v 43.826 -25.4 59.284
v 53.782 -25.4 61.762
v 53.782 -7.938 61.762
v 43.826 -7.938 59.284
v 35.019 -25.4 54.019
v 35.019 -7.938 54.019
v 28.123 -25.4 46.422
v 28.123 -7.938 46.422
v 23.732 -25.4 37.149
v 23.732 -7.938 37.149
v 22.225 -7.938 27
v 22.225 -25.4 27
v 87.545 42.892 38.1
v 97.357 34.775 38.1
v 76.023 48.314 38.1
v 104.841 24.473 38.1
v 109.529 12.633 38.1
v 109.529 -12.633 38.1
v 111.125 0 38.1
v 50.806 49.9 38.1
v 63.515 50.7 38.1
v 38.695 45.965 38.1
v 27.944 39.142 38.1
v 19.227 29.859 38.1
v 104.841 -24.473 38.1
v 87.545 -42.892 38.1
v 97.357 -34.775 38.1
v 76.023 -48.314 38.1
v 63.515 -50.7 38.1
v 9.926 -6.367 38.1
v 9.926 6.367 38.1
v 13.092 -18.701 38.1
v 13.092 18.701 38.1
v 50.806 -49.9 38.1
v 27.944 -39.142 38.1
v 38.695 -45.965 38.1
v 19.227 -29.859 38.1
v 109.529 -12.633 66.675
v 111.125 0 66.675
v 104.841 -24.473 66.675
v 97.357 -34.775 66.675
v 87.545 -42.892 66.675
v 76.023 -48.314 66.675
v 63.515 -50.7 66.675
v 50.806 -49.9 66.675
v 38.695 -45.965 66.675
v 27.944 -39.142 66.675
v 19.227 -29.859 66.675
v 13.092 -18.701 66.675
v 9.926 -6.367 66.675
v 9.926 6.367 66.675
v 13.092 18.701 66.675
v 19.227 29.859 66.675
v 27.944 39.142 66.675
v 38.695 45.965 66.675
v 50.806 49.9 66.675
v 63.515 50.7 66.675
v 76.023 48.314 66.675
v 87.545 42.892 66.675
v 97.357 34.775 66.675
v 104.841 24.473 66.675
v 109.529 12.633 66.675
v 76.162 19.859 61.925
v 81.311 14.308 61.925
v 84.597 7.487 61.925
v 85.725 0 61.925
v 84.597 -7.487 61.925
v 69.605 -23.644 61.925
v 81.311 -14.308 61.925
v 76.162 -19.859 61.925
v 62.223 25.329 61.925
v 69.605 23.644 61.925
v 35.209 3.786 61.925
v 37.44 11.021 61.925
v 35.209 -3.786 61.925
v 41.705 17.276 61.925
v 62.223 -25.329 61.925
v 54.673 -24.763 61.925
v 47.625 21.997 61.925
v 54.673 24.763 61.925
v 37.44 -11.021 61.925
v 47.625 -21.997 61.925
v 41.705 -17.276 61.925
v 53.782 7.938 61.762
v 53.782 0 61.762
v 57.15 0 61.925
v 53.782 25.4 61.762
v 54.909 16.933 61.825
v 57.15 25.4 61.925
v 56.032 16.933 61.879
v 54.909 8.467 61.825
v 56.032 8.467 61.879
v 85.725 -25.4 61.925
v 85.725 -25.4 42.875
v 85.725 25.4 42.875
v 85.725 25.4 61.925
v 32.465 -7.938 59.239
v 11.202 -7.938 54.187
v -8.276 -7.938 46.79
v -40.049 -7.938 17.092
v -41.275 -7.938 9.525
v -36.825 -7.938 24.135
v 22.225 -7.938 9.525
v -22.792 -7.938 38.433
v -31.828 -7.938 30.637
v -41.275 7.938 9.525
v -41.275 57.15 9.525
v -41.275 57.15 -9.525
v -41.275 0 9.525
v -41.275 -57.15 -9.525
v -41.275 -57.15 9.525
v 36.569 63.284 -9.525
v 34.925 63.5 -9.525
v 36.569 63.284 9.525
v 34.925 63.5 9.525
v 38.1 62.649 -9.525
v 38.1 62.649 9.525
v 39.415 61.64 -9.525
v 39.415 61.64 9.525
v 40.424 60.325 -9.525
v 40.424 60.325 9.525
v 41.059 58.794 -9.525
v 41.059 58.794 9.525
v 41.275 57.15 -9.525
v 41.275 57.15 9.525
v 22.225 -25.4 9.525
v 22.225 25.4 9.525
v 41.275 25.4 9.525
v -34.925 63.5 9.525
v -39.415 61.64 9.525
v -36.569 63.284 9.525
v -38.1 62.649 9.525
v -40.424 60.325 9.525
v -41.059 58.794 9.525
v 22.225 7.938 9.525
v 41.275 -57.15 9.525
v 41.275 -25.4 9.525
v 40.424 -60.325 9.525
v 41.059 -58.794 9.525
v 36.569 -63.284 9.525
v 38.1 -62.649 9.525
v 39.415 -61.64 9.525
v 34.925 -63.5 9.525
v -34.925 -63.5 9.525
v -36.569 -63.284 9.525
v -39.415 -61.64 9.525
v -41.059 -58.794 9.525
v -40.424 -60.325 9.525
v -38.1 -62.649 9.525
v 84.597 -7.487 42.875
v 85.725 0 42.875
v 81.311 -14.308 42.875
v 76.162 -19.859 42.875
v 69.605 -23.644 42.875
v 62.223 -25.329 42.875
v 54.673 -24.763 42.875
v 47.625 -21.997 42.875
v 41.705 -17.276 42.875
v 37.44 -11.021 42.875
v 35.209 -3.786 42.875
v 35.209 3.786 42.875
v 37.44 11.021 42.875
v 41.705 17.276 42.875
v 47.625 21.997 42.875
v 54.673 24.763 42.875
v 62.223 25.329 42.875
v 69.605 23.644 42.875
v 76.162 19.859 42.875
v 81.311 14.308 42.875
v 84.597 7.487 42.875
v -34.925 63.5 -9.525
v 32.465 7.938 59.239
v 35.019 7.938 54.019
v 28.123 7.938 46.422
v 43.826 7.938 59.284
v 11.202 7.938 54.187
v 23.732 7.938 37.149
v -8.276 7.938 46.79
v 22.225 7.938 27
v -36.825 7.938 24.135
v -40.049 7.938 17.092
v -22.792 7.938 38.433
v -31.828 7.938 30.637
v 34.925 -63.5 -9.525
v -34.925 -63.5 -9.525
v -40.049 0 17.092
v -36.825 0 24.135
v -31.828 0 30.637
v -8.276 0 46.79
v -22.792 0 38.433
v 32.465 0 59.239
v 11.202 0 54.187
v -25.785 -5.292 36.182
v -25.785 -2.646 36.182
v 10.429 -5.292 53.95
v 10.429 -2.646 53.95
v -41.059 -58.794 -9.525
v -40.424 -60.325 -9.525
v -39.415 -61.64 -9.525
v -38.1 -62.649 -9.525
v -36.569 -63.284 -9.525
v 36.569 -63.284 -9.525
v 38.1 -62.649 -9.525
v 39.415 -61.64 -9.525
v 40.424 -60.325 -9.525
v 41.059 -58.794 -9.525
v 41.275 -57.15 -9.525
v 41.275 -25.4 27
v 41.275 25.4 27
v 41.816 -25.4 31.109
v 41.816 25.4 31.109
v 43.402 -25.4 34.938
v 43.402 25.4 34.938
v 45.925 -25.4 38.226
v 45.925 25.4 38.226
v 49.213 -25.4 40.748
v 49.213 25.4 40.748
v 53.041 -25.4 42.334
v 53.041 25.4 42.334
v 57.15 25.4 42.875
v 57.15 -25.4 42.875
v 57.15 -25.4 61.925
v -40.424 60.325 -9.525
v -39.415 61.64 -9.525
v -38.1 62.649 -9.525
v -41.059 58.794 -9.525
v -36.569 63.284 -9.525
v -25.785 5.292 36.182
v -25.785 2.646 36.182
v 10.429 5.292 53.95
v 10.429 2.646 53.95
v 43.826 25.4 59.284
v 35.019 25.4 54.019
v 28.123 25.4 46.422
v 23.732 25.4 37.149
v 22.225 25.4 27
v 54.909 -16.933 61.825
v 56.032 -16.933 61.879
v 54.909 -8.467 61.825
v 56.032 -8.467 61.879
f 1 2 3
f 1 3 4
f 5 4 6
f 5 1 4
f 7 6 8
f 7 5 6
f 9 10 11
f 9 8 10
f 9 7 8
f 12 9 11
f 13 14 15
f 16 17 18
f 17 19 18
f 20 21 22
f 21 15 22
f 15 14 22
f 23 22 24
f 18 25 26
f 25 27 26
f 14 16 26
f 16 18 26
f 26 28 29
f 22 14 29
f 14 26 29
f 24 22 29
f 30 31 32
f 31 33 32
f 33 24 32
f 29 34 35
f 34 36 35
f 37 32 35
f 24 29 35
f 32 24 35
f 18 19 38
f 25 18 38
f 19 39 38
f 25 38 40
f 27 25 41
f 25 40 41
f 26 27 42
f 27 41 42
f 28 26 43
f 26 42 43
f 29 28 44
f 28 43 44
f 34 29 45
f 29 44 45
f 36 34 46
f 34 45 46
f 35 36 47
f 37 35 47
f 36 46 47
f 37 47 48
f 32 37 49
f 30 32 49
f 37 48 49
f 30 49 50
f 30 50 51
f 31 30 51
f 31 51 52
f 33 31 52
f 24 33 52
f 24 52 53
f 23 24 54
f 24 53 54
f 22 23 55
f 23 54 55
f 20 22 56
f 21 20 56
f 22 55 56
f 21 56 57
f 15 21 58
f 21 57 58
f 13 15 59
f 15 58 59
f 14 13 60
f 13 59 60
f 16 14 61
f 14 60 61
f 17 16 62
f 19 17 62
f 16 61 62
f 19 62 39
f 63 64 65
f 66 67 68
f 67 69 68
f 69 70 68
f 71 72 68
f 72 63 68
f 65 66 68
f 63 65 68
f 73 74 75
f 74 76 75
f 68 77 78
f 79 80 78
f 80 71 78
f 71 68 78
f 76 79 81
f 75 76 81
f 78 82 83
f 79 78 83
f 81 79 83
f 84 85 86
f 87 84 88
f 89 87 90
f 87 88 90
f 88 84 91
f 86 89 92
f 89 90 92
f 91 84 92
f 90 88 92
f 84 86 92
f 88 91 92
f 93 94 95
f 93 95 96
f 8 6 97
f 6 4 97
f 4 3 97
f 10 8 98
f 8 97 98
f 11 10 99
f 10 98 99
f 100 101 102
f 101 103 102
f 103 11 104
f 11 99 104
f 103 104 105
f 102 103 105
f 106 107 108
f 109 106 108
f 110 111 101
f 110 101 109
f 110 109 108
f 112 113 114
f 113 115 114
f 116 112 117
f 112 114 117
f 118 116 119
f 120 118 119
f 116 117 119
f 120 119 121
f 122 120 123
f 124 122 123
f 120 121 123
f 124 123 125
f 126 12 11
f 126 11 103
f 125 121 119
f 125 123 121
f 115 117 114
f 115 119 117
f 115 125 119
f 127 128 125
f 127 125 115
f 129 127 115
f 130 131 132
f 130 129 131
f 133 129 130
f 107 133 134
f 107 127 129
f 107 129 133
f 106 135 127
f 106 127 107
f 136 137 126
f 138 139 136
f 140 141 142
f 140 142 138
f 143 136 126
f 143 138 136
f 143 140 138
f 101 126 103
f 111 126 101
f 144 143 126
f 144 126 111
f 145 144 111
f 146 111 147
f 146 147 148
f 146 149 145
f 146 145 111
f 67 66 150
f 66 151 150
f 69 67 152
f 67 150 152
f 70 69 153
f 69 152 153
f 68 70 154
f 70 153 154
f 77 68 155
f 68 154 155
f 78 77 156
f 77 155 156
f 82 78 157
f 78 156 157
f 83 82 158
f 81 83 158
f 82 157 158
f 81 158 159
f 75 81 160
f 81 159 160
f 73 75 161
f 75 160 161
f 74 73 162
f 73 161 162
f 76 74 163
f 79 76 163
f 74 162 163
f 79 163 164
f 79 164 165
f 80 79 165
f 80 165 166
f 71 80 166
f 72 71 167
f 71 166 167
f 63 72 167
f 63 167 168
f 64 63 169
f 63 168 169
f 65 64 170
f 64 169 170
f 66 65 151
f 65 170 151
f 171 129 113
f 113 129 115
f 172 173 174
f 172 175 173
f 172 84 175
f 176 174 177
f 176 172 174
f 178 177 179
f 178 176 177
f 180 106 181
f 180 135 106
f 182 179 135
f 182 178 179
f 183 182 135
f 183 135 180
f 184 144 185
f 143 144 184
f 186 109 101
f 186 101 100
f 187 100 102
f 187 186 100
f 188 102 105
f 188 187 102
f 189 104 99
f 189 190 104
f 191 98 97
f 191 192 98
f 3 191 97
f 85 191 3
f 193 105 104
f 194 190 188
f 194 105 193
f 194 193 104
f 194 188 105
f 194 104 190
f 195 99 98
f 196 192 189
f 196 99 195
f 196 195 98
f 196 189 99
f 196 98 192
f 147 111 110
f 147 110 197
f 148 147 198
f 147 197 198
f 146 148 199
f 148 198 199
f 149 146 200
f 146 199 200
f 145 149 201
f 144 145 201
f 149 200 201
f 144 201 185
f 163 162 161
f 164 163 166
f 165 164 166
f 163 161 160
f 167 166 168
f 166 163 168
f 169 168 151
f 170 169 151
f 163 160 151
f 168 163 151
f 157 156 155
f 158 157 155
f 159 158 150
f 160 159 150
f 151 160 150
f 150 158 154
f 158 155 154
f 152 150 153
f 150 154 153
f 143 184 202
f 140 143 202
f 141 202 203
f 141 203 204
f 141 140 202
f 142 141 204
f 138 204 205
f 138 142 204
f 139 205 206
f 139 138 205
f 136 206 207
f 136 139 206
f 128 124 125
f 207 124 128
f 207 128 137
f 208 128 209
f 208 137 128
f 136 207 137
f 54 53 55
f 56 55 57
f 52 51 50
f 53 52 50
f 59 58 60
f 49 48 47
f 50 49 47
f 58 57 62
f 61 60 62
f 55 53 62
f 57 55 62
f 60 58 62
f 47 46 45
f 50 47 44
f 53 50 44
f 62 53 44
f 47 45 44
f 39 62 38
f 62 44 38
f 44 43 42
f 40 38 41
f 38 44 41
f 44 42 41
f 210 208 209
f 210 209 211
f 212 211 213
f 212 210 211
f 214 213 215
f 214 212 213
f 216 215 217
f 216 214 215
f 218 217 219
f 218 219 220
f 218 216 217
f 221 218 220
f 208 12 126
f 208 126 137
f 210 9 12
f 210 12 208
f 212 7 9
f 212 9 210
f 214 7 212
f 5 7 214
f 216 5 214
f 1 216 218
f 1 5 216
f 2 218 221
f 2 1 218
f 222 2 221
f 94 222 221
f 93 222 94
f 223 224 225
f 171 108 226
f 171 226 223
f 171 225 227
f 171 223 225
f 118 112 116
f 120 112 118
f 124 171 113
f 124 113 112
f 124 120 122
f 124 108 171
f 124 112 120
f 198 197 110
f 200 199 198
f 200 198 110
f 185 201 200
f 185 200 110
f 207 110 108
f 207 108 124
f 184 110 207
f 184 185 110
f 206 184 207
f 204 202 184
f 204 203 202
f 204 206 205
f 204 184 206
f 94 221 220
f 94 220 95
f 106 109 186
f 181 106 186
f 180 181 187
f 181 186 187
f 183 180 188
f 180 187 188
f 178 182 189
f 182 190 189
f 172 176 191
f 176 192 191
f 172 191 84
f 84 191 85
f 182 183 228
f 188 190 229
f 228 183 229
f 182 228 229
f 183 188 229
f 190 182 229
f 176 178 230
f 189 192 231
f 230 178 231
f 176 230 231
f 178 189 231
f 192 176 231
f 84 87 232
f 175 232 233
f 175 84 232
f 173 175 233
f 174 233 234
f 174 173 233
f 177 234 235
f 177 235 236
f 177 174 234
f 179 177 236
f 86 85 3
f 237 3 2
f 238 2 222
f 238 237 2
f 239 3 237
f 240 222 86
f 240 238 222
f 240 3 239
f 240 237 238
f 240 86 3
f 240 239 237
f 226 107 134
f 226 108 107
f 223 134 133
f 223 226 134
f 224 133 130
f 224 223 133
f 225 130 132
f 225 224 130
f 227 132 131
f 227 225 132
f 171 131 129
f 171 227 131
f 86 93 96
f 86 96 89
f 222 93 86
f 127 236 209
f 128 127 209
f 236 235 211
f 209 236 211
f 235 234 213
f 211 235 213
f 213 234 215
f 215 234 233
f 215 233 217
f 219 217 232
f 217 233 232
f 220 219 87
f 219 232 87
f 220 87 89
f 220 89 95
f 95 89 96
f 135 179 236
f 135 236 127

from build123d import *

# Parameters (mm, degrees)
F2_DEPTH = 63.5
F0_W     = 25.4
F0_H     = 19.05
F3_DEPTH = 25.4
F4_DEPTH = 7.9375
F6_R     = 6.35


with BuildPart() as f2:
    # F0 (on Front) → F2 (new body, symmetric)
    with BuildSketch(Plane.XZ):
        Polygon((22.225, 9.525), (-41.275, 9.525), (-41.275, -9.525), (41.275, -9.525), (41.275, 9.525), align=None)
    extrude(amount=F2_DEPTH, both=True)

    # F0 (on Front) → F3 (join, symmetric)
    with BuildSketch(Plane.XZ):
        with BuildLine():
            Line((22.225, 27.0002), (22.225, 9.525))
            Line((22.225, 9.525), (41.275, 9.525))
            Line((41.275, 9.525), (41.275, 27.0002))
            ThreePointArc((41.275, 27.0002), (45.92468, 38.22552), (57.15, 42.8752))
            Line((57.15, 42.8752), (60.325, 42.8752))
            Line((60.325, 42.8752), (60.325, 61.9252))
            Line((60.325, 61.9252), (57.15, 61.9252))
            add(Edge.make_bspline(
                [(53.781743, 61.762399), (54.91175, 61.828445), (56.034888, 61.882742), (57.15, 61.9252)],
                knots=[108.60958, 108.60958, 108.60958, 108.60958, 111.504536, 111.504536, 111.504536, 111.504536], degree=3))
            ThreePointArc((53.781743, 61.762399), (31.290843, 50.474859), (22.225, 27.0002))
        make_face()
        with Locations((73.025, 52.4002)):
            Rectangle(F0_W, F0_H)
    extrude(amount=F3_DEPTH, both=True)

    # F0 (on Front) → F4 (join, symmetric)
    with BuildSketch(Plane.XZ):
        with BuildLine():
            add(Edge.make_bspline(
                [(-41.275, 9.525), (-40.674691, 40.270035), (11.387457, 59.284553), (53.781743, 61.762399)],
                knots=[0, 0, 0, 0, 108.60958, 108.60958, 108.60958, 108.60958], degree=3))
            Line((-41.275, 9.525), (22.225, 9.525))
            Line((22.225, 9.525), (22.225, 27.0002))
            ThreePointArc((22.225, 27.0002), (31.290843, 50.474859), (53.781743, 61.762399))
        make_face()
    extrude(amount=F4_DEPTH, both=True)

    # F6
    f6_edges = [f2.edges().sort_by_distance(p)[0] for p in [
        (41.275, -63.5, 0),
        (-41.275, -63.5, 0),
        (41.275, 63.5, 0),
        (-41.275, 63.5, 0),
    ]]
    fillet(f6_edges, radius=F6_R)


with BuildPart() as f5:
    # F0 (on Front) → F5 (revolve)
    with BuildSketch(Plane.XZ):
        Polygon((60.325, 66.675), (60.325, 61.9252), (85.725, 61.9252), (85.725, 42.8752), (60.325, 42.8752), (60.325, 38.1), (111.125, 38.1), (111.125, 66.675), align=None)
    revolve(axis=Axis((60.325, 0, 52.3875), (0, 0, -1)))


solid = Compound([f2.part, f5.part])
